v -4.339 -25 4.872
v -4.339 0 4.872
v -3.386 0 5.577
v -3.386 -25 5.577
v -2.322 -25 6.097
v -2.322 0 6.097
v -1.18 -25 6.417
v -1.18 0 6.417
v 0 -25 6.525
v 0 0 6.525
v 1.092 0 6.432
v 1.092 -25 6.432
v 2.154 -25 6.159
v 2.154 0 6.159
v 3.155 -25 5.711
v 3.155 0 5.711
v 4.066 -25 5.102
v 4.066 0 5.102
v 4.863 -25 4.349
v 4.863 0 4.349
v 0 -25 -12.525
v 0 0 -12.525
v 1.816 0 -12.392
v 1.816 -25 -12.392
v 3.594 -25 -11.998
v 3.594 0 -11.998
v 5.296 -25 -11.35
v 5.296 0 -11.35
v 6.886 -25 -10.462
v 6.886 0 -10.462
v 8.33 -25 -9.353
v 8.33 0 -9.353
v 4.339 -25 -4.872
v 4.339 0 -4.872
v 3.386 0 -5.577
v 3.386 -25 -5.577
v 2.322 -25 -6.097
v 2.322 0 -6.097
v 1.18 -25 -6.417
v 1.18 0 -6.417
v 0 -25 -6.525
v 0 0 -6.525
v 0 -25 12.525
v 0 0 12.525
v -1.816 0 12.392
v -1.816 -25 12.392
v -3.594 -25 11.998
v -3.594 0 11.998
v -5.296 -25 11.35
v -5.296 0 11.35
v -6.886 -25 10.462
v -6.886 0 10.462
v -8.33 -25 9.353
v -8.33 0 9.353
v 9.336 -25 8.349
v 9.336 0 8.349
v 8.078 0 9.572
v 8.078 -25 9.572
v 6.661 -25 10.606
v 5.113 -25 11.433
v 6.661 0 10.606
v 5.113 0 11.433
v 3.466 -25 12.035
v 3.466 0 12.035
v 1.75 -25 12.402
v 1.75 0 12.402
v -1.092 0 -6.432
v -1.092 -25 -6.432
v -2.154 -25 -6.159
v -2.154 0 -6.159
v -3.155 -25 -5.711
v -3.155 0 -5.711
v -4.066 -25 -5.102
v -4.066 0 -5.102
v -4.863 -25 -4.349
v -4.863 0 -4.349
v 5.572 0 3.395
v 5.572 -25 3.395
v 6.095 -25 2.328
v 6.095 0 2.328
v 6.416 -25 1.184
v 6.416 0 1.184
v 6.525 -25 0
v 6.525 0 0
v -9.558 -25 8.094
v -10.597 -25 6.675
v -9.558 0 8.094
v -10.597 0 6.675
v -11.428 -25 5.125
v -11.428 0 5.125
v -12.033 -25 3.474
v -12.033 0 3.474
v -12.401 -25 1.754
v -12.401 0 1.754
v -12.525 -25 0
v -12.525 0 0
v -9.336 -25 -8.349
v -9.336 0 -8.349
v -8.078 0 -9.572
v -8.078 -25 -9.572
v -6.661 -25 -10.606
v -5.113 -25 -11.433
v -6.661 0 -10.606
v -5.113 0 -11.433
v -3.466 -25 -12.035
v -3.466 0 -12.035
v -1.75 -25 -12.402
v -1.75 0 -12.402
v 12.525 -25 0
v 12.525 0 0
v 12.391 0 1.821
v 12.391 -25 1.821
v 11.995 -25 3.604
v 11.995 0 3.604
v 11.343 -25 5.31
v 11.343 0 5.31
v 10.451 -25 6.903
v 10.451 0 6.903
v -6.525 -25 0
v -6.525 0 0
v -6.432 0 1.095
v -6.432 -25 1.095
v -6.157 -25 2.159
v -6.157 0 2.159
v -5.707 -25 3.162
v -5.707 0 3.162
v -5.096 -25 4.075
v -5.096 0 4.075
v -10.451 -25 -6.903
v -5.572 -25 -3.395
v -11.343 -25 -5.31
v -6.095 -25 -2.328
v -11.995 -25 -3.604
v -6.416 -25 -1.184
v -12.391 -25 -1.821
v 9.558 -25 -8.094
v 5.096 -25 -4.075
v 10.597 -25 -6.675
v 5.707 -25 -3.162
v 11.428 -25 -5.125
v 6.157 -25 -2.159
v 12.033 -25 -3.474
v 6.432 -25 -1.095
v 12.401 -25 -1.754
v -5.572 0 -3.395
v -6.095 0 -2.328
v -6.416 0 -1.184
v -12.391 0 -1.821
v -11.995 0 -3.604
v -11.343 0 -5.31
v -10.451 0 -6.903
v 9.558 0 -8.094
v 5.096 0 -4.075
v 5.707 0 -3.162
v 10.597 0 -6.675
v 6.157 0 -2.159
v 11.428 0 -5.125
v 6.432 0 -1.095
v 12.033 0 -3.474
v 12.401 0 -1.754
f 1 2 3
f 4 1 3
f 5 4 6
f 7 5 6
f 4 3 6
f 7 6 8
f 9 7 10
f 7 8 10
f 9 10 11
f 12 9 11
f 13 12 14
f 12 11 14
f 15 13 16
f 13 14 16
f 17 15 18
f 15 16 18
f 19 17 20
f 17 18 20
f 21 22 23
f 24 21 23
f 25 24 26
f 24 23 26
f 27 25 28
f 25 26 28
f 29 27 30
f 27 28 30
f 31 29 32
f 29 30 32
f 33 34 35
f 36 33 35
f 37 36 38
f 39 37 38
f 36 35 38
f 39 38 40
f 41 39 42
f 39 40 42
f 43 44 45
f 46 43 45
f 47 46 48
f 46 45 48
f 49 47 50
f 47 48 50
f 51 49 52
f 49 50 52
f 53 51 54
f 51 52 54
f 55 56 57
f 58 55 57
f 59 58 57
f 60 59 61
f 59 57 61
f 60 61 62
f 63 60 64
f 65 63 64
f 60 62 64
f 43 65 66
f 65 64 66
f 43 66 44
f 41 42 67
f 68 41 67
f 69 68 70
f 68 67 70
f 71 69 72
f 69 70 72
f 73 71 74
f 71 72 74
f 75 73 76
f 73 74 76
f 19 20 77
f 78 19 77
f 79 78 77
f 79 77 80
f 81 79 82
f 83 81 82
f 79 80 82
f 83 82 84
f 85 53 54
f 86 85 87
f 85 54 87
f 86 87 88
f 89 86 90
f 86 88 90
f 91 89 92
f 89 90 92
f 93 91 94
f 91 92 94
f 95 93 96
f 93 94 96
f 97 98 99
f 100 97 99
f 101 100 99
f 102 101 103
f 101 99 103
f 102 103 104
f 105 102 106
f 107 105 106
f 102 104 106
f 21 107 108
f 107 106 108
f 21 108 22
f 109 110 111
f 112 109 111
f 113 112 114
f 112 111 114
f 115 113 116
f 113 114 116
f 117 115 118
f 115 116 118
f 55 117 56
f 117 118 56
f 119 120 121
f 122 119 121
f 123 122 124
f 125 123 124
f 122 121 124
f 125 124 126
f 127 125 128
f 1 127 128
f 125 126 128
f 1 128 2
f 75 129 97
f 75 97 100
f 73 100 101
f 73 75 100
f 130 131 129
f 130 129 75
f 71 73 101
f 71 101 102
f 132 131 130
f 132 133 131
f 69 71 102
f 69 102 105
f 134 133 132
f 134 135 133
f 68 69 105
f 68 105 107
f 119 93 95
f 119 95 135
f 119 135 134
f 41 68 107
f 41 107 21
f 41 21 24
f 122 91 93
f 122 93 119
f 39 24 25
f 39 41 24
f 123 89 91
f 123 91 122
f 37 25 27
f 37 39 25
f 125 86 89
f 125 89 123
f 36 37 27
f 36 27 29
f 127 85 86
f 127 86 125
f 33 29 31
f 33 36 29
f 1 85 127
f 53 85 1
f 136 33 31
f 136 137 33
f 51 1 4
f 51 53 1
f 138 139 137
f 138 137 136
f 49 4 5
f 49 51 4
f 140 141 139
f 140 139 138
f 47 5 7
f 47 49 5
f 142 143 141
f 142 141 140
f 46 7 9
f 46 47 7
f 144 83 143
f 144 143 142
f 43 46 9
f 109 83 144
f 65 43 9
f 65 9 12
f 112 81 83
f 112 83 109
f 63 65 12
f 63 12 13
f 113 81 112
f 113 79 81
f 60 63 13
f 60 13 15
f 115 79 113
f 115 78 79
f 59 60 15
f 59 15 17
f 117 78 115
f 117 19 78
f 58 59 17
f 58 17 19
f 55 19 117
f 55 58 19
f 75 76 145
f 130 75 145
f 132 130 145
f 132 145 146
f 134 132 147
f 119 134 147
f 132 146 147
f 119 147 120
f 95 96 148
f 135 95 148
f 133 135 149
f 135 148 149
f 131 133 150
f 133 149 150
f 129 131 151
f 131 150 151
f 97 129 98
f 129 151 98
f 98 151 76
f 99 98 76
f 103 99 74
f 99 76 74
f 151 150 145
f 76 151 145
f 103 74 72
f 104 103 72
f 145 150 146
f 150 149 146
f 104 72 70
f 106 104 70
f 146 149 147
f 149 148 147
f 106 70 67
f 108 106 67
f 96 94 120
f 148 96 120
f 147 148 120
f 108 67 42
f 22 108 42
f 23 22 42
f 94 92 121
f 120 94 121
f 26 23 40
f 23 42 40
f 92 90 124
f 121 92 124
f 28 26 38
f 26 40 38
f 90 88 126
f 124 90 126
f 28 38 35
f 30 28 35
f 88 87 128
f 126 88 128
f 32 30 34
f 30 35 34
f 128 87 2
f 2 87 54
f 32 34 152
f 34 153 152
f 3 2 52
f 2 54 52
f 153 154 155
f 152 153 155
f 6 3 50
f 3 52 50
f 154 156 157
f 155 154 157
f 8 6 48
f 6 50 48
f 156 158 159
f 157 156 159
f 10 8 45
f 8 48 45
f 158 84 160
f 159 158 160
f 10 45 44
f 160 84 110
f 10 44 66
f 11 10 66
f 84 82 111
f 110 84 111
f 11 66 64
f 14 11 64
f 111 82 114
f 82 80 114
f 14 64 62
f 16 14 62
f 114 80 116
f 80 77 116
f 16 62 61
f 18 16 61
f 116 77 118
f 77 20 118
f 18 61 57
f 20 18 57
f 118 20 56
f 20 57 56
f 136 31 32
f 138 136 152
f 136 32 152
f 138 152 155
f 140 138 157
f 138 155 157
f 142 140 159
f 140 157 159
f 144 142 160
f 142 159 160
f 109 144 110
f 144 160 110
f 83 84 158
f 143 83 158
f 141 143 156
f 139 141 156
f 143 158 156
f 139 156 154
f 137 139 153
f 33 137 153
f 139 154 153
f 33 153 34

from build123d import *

# Parameters (mm, degrees)
F1_DEPTH = 25


with BuildPart() as f1:
    # F0 (on Front) → F1 (new body)
    with BuildSketch(Plane.XZ):
        with BuildLine():
            ThreePointArc((-4.3394231509, 4.8722430533), (-2.3216701125, 6.0974743576), (0, 6.5245188062))
            Line((0, 6.5245188062), (0, 12.5245188062))
            ThreePointArc((0, 12.5245188062), (-4.4566966316, 11.7047608459), (-8.3299916017, 9.3527969743))
            Line((-8.3299916017, 9.3527969743), (-4.3394231509, 4.8722430533))
        make_face()
        with BuildLine():
            Line((-12.5245188062, 0), (-6.5245188062, 0))
            ThreePointArc((-6.5245188062, 0), (-5.9532341466, 2.6698967861), (-4.3394231509, 4.8722430533))
            Line((-4.3394231509, 4.8722430533), (-8.3299916017, 9.3527969743))
            ThreePointArc((-8.3299916017, 9.3527969743), (-11.4278761762, 5.1251553564), (-12.5245188062, 0))
        make_face()
        with BuildLine():
            ThreePointArc((-4.8633482309, -4.3493895707), (-6.0950944474, -2.3279109368), (-6.5245188062, 0))
            Line((-6.5245188062, 0), (-12.5245188062, 0))
            ThreePointArc((-12.5245188062, 0), (-11.7001923513, -4.468676568), (-9.3357224016, -8.3491232214))
            Line((-9.3357224016, -8.3491232214), (-4.8633482309, -4.3493895707))
        make_face()
        with BuildLine():
            Line((0, -12.5245188062), (0, -6.5245188062))
            ThreePointArc((0, -6.5245188062), (-2.6638010064, -5.9559642251), (-4.8633482309, -4.3493895707))
            Line((-4.8633482309, -4.3493895707), (-9.3357224016, -8.3491232214))
            ThreePointArc((-9.3357224016, -8.3491232214), (-5.1134538487, -11.4331168569), (0, -12.5245188062))
        make_face()
        with BuildLine():
            Line((8.3299916017, -9.3527969743), (4.3394231509, -4.8722430533))
            ThreePointArc((4.3394231509, -4.8722430533), (2.3216701125, -6.0974743576), (0, -6.5245188062))
            Line((0, -6.5245188062), (0, -12.5245188062))
            ThreePointArc((0, -12.5245188062), (4.4566966316, -11.7047608459), (8.3299916017, -9.3527969743))
        make_face()
        with BuildLine():
            ThreePointArc((4.8633482309, 4.3493895707), (6.0950944474, 2.3279109368), (6.5245188062, 0))
            Line((6.5245188062, 0), (12.5245188062, 0))
            ThreePointArc((12.5245188062, 0), (11.7001923513, 4.468676568), (9.3357224016, 8.3491232214))
            Line((9.3357224016, 8.3491232214), (4.8633482309, 4.3493895707))
        make_face()
        with BuildLine():
            ThreePointArc((0, 6.5245188062), (2.6638010064, 5.9559642251), (4.8633482309, 4.3493895707))
            Line((4.8633482309, 4.3493895707), (9.3357224016, 8.3491232214))
            ThreePointArc((9.3357224016, 8.3491232214), (5.1134538487, 11.4331168569), (0, 12.5245188062))
            Line((0, 12.5245188062), (0, 6.5245188062))
        make_face()
        with BuildLine():
            Line((12.5245188062, 0), (6.5245188062, 0))
            ThreePointArc((6.5245188062, 0), (5.9532341466, -2.6698967861), (4.3394231509, -4.8722430533))
            Line((4.3394231509, -4.8722430533), (8.3299916017, -9.3527969743))
            ThreePointArc((8.3299916017, -9.3527969743), (11.4278761762, -5.1251553564), (12.5245188062, 0))
        make_face()
    extrude(amount=F1_DEPTH)


solid = f1.part
